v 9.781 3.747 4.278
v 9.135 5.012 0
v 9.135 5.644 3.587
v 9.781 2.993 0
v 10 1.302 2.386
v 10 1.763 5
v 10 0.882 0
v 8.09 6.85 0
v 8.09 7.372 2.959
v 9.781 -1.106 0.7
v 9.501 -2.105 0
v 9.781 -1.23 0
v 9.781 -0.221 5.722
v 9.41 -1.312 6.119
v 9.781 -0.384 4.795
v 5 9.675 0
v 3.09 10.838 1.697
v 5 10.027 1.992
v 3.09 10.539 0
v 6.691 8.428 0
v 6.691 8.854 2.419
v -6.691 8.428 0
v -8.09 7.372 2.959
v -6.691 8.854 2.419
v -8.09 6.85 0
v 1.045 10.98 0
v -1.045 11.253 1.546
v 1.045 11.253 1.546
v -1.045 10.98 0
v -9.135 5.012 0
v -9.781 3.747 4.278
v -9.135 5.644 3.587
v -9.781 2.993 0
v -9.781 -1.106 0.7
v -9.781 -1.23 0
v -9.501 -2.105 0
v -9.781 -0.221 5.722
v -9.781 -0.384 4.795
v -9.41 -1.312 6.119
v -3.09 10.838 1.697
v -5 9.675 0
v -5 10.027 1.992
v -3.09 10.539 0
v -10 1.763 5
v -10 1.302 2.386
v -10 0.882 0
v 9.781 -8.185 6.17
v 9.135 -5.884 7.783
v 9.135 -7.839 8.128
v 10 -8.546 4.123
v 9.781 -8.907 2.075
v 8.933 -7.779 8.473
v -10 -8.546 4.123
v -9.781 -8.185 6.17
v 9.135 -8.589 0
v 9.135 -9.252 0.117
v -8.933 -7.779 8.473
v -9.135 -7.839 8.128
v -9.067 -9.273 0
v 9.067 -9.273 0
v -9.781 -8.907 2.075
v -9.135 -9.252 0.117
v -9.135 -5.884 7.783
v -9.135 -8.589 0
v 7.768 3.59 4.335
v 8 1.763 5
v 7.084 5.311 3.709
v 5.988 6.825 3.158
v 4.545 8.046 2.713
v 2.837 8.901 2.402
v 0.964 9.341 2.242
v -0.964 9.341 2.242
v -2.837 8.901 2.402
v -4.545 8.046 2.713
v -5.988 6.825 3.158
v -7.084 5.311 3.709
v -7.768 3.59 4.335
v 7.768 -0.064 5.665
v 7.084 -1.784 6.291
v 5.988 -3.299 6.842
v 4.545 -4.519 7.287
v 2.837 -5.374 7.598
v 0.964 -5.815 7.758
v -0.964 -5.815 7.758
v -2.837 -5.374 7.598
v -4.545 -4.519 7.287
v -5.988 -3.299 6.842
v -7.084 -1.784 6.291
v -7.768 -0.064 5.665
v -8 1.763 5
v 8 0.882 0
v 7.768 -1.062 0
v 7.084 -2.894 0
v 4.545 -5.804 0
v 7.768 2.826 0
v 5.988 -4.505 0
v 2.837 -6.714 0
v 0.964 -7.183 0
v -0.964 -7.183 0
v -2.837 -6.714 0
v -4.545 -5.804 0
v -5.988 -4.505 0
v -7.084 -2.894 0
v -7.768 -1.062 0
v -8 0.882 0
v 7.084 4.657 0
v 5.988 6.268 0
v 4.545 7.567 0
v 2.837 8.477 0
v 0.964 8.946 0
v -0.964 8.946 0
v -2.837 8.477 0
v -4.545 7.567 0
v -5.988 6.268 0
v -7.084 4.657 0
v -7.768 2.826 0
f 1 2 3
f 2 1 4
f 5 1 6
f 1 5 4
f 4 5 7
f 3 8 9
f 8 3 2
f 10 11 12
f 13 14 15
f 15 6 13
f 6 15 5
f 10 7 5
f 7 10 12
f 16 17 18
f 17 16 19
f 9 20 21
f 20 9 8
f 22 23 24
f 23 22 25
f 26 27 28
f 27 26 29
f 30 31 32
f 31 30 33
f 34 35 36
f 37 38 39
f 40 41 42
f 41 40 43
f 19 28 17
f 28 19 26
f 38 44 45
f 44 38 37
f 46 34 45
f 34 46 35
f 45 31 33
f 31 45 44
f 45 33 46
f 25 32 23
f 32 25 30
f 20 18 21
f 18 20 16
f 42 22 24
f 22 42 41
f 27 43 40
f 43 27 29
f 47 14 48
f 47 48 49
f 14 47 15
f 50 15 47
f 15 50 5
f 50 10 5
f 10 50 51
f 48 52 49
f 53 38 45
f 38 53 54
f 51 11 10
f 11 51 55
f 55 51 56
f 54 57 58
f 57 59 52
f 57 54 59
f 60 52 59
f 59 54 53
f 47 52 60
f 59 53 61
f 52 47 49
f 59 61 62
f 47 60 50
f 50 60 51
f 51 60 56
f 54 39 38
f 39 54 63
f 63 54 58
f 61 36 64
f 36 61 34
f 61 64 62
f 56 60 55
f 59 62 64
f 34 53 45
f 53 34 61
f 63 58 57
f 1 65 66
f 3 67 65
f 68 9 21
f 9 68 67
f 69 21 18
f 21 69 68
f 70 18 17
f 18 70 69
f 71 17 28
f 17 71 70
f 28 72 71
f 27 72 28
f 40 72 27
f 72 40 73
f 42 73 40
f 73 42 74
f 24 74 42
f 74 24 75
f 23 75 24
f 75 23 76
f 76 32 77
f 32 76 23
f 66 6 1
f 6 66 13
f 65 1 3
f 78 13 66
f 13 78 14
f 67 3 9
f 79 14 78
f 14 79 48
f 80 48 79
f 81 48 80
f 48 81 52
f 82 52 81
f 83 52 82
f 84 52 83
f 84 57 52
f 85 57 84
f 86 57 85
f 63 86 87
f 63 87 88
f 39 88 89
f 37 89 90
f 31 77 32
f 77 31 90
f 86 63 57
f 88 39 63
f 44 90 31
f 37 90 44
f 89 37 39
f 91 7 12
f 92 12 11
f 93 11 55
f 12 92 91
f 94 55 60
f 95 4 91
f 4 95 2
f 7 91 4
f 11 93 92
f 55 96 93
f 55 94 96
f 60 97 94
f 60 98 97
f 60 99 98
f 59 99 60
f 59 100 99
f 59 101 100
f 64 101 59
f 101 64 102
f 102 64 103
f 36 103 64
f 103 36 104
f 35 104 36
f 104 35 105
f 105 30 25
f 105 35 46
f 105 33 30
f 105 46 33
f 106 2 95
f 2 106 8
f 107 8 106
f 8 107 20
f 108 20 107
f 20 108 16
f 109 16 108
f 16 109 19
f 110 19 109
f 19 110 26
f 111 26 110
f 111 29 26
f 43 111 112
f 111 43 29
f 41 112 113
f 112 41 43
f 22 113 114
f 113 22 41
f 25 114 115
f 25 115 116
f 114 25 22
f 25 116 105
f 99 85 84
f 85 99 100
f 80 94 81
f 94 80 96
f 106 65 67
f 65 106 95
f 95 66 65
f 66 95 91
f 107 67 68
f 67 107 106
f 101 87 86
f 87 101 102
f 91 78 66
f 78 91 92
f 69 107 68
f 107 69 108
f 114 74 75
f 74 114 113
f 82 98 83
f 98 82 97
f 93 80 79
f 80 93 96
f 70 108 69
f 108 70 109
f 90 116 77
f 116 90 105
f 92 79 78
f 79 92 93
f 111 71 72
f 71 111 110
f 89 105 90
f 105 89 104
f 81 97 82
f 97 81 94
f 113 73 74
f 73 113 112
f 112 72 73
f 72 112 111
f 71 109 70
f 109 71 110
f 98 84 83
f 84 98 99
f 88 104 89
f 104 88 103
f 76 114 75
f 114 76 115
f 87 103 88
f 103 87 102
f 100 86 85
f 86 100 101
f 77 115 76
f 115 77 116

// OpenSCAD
translate([0, 0, -5]) rotate([-10,0,0]) {
  difference () {
    /* Ring */
    union() {
      cylinder(15, 10, 10);
      rotate([90, 0, 0]) translate([0, 7.5, 0]) cylinder(10, 10, 10);
    }
    rotate([-10,0,0]) translate([-25, -25, 10]) cube(50);
    rotate([10,0,0]) translate([-25, -25, -45]) cube(50);
    translate([0, 0, -25]) cylinder(50, 8, 8);
  }
}
